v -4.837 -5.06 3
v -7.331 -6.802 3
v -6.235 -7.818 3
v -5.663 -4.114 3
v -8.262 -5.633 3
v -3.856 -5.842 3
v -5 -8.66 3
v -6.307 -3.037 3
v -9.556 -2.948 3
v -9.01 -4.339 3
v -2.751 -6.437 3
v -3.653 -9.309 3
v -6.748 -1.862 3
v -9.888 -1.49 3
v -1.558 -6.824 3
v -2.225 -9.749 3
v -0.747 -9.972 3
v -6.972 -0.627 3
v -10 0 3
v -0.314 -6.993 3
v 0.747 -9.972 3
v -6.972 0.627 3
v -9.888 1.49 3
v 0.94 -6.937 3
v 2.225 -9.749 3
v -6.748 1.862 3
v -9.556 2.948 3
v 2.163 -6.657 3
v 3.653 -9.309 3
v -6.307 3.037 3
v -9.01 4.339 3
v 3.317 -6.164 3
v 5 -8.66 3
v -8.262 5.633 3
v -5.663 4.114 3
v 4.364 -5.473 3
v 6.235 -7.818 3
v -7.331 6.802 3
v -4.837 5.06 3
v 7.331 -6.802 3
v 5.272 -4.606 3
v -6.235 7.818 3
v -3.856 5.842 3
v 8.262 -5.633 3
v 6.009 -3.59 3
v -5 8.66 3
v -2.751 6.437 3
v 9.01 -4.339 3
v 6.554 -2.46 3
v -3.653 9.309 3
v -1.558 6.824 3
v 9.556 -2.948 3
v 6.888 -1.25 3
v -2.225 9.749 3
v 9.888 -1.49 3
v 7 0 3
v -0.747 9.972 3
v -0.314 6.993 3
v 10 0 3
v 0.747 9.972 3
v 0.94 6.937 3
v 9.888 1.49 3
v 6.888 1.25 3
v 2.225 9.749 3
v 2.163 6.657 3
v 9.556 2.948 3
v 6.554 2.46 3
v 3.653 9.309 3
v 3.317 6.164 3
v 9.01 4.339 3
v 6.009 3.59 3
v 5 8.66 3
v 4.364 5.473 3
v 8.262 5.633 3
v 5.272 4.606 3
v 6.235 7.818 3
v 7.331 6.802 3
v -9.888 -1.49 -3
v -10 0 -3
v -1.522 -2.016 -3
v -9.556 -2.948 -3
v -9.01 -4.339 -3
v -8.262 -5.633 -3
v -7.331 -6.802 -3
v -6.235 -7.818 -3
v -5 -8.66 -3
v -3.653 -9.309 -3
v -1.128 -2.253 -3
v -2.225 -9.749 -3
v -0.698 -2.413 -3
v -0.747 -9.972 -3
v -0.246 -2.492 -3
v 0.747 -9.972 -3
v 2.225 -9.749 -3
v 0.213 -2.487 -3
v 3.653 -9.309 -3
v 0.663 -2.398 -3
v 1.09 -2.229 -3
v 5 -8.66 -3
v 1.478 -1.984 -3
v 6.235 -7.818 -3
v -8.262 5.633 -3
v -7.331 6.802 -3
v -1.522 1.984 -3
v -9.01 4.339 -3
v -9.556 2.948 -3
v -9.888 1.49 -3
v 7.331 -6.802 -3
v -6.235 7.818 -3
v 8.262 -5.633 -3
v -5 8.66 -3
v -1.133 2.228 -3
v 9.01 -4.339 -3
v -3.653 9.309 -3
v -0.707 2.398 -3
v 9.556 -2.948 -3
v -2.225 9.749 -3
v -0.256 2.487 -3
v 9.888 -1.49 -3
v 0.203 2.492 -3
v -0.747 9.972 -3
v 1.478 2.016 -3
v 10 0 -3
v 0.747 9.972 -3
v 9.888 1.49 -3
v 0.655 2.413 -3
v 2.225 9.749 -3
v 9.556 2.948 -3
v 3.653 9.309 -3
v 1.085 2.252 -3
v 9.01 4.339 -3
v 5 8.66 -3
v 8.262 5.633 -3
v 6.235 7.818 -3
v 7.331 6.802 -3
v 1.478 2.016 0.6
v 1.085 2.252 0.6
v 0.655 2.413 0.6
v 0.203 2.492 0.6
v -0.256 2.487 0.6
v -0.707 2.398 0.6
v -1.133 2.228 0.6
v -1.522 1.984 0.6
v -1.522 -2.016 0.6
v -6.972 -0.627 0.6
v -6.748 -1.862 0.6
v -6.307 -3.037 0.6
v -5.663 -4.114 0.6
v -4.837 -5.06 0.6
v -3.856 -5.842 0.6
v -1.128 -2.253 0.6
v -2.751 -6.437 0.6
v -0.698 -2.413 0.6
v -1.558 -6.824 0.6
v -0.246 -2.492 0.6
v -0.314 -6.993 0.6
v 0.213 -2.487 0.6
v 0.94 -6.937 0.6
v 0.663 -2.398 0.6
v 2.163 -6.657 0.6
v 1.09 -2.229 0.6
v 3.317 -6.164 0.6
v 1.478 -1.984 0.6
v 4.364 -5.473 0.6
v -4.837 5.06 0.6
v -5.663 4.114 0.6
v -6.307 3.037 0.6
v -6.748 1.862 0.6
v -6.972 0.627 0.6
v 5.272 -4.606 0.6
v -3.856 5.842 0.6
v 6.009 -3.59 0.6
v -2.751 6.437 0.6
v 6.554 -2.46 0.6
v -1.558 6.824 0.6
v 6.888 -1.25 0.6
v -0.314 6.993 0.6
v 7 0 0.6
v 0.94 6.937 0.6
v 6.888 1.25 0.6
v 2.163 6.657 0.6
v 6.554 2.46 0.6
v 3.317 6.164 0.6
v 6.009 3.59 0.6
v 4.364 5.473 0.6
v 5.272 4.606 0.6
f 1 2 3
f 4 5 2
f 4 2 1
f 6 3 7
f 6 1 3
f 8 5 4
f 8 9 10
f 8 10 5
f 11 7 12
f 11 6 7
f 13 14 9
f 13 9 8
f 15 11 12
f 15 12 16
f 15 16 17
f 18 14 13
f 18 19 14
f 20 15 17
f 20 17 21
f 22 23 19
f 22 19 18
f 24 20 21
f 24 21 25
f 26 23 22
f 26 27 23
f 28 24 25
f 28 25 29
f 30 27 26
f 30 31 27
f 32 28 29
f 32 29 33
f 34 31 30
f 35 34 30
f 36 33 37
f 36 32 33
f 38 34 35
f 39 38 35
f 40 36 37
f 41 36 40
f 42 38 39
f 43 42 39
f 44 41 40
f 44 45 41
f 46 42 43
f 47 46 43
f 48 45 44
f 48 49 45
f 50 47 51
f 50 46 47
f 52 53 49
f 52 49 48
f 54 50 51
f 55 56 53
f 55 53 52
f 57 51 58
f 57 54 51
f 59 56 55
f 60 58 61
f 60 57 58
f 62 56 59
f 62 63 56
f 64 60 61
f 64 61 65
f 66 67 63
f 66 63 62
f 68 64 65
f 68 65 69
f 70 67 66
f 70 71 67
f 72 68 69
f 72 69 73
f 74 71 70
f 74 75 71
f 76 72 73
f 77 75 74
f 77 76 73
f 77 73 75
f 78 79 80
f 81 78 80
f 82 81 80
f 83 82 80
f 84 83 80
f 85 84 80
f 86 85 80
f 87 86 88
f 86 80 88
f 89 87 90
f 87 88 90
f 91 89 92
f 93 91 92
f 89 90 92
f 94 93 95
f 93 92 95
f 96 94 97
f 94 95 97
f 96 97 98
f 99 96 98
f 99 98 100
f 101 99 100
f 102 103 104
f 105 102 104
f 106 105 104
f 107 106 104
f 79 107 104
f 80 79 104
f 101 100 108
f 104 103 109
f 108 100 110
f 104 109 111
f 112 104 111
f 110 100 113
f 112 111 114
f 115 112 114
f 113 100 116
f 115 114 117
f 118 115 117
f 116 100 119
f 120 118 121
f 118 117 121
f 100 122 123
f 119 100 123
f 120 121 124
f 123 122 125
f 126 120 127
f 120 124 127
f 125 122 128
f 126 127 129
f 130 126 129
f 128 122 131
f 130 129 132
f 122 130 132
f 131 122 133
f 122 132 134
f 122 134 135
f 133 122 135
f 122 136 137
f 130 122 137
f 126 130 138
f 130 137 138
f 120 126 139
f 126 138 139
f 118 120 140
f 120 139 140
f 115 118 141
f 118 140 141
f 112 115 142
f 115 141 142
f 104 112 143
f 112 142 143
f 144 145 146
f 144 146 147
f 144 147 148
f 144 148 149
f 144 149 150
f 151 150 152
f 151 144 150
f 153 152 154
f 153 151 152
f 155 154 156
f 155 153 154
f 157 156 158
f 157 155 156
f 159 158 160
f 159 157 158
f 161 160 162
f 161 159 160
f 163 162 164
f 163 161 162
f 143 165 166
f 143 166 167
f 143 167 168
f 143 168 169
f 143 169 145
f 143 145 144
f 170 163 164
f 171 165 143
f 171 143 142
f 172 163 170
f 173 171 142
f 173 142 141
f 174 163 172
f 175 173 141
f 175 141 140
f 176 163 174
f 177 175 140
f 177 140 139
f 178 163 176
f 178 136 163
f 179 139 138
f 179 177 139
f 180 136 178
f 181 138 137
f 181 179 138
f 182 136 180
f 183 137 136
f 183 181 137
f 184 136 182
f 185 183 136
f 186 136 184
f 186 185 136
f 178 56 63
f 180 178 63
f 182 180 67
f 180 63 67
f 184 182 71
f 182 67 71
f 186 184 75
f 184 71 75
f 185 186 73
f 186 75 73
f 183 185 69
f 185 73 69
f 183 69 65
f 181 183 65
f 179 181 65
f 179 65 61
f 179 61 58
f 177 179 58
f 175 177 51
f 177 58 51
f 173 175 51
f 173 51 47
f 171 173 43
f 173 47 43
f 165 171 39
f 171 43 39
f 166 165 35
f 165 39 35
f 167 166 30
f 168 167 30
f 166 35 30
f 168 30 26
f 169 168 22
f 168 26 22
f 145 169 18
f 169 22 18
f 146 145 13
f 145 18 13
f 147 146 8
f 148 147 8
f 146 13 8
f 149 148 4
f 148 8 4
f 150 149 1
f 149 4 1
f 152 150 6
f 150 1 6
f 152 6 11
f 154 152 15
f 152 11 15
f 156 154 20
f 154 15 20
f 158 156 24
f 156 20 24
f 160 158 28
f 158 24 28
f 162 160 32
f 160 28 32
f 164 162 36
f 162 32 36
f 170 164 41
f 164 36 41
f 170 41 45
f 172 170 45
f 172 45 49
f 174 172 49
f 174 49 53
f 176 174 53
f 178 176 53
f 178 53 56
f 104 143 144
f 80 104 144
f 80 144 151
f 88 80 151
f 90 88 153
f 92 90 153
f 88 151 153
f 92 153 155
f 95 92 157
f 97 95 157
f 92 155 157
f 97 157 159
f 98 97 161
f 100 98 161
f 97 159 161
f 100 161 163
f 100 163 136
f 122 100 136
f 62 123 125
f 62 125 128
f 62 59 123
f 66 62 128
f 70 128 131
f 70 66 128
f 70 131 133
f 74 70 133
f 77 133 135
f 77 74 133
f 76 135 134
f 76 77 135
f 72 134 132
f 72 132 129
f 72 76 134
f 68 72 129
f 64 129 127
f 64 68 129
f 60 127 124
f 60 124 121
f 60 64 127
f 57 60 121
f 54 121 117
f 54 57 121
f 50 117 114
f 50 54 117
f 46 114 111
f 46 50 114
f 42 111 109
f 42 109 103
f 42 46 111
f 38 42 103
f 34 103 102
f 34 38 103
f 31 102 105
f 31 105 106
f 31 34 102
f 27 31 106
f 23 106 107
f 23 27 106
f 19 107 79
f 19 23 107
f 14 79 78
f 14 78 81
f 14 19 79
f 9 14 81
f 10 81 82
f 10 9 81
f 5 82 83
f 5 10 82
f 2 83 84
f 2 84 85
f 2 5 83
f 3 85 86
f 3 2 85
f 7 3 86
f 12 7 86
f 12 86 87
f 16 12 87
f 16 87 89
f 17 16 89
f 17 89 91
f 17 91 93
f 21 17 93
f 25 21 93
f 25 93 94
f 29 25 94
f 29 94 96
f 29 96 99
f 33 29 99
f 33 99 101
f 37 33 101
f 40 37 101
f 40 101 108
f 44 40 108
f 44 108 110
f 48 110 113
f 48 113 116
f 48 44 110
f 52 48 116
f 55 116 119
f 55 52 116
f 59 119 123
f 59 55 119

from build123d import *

# Parameters (mm, degrees)
SKETCH1_R           = 10
BOSS_EXTRUDE1_DEPTH = 3
SKETCH2_R           = 7
CUT_EXTRUDE1_DEPTH  = 2.4


with BuildPart() as part:
    # Sketch1 → Boss-Extrude1 (new, symmetric)
    with BuildSketch(Plane.XY):
        Circle(SKETCH1_R)
        with BuildLine():
            Line((-1.521572539, 1.983637318), (-1.521572539, -2.016362682))
            ThreePointArc((-1.521572539, -2.016362682), (-0.016245384, -2.500087973), (1.478251514, -1.983871914))
            Line((1.478251514, -1.983871914), (1.478251514, 2.016128086))
            ThreePointArc((1.478251514, 2.016128086), (-0.02707564, 2.499853378), (-1.521572539, 1.983637318))
        make_face(mode=Mode.SUBTRACT)
    extrude(amount=BOSS_EXTRUDE1_DEPTH, both=True)

    # Sketch2 → Cut-Extrude1 (cut)
    with BuildSketch(Plane.XY.offset(3)):
        Circle(SKETCH2_R)
    extrude(amount=-CUT_EXTRUDE1_DEPTH, mode=Mode.SUBTRACT)


solid = part.part
